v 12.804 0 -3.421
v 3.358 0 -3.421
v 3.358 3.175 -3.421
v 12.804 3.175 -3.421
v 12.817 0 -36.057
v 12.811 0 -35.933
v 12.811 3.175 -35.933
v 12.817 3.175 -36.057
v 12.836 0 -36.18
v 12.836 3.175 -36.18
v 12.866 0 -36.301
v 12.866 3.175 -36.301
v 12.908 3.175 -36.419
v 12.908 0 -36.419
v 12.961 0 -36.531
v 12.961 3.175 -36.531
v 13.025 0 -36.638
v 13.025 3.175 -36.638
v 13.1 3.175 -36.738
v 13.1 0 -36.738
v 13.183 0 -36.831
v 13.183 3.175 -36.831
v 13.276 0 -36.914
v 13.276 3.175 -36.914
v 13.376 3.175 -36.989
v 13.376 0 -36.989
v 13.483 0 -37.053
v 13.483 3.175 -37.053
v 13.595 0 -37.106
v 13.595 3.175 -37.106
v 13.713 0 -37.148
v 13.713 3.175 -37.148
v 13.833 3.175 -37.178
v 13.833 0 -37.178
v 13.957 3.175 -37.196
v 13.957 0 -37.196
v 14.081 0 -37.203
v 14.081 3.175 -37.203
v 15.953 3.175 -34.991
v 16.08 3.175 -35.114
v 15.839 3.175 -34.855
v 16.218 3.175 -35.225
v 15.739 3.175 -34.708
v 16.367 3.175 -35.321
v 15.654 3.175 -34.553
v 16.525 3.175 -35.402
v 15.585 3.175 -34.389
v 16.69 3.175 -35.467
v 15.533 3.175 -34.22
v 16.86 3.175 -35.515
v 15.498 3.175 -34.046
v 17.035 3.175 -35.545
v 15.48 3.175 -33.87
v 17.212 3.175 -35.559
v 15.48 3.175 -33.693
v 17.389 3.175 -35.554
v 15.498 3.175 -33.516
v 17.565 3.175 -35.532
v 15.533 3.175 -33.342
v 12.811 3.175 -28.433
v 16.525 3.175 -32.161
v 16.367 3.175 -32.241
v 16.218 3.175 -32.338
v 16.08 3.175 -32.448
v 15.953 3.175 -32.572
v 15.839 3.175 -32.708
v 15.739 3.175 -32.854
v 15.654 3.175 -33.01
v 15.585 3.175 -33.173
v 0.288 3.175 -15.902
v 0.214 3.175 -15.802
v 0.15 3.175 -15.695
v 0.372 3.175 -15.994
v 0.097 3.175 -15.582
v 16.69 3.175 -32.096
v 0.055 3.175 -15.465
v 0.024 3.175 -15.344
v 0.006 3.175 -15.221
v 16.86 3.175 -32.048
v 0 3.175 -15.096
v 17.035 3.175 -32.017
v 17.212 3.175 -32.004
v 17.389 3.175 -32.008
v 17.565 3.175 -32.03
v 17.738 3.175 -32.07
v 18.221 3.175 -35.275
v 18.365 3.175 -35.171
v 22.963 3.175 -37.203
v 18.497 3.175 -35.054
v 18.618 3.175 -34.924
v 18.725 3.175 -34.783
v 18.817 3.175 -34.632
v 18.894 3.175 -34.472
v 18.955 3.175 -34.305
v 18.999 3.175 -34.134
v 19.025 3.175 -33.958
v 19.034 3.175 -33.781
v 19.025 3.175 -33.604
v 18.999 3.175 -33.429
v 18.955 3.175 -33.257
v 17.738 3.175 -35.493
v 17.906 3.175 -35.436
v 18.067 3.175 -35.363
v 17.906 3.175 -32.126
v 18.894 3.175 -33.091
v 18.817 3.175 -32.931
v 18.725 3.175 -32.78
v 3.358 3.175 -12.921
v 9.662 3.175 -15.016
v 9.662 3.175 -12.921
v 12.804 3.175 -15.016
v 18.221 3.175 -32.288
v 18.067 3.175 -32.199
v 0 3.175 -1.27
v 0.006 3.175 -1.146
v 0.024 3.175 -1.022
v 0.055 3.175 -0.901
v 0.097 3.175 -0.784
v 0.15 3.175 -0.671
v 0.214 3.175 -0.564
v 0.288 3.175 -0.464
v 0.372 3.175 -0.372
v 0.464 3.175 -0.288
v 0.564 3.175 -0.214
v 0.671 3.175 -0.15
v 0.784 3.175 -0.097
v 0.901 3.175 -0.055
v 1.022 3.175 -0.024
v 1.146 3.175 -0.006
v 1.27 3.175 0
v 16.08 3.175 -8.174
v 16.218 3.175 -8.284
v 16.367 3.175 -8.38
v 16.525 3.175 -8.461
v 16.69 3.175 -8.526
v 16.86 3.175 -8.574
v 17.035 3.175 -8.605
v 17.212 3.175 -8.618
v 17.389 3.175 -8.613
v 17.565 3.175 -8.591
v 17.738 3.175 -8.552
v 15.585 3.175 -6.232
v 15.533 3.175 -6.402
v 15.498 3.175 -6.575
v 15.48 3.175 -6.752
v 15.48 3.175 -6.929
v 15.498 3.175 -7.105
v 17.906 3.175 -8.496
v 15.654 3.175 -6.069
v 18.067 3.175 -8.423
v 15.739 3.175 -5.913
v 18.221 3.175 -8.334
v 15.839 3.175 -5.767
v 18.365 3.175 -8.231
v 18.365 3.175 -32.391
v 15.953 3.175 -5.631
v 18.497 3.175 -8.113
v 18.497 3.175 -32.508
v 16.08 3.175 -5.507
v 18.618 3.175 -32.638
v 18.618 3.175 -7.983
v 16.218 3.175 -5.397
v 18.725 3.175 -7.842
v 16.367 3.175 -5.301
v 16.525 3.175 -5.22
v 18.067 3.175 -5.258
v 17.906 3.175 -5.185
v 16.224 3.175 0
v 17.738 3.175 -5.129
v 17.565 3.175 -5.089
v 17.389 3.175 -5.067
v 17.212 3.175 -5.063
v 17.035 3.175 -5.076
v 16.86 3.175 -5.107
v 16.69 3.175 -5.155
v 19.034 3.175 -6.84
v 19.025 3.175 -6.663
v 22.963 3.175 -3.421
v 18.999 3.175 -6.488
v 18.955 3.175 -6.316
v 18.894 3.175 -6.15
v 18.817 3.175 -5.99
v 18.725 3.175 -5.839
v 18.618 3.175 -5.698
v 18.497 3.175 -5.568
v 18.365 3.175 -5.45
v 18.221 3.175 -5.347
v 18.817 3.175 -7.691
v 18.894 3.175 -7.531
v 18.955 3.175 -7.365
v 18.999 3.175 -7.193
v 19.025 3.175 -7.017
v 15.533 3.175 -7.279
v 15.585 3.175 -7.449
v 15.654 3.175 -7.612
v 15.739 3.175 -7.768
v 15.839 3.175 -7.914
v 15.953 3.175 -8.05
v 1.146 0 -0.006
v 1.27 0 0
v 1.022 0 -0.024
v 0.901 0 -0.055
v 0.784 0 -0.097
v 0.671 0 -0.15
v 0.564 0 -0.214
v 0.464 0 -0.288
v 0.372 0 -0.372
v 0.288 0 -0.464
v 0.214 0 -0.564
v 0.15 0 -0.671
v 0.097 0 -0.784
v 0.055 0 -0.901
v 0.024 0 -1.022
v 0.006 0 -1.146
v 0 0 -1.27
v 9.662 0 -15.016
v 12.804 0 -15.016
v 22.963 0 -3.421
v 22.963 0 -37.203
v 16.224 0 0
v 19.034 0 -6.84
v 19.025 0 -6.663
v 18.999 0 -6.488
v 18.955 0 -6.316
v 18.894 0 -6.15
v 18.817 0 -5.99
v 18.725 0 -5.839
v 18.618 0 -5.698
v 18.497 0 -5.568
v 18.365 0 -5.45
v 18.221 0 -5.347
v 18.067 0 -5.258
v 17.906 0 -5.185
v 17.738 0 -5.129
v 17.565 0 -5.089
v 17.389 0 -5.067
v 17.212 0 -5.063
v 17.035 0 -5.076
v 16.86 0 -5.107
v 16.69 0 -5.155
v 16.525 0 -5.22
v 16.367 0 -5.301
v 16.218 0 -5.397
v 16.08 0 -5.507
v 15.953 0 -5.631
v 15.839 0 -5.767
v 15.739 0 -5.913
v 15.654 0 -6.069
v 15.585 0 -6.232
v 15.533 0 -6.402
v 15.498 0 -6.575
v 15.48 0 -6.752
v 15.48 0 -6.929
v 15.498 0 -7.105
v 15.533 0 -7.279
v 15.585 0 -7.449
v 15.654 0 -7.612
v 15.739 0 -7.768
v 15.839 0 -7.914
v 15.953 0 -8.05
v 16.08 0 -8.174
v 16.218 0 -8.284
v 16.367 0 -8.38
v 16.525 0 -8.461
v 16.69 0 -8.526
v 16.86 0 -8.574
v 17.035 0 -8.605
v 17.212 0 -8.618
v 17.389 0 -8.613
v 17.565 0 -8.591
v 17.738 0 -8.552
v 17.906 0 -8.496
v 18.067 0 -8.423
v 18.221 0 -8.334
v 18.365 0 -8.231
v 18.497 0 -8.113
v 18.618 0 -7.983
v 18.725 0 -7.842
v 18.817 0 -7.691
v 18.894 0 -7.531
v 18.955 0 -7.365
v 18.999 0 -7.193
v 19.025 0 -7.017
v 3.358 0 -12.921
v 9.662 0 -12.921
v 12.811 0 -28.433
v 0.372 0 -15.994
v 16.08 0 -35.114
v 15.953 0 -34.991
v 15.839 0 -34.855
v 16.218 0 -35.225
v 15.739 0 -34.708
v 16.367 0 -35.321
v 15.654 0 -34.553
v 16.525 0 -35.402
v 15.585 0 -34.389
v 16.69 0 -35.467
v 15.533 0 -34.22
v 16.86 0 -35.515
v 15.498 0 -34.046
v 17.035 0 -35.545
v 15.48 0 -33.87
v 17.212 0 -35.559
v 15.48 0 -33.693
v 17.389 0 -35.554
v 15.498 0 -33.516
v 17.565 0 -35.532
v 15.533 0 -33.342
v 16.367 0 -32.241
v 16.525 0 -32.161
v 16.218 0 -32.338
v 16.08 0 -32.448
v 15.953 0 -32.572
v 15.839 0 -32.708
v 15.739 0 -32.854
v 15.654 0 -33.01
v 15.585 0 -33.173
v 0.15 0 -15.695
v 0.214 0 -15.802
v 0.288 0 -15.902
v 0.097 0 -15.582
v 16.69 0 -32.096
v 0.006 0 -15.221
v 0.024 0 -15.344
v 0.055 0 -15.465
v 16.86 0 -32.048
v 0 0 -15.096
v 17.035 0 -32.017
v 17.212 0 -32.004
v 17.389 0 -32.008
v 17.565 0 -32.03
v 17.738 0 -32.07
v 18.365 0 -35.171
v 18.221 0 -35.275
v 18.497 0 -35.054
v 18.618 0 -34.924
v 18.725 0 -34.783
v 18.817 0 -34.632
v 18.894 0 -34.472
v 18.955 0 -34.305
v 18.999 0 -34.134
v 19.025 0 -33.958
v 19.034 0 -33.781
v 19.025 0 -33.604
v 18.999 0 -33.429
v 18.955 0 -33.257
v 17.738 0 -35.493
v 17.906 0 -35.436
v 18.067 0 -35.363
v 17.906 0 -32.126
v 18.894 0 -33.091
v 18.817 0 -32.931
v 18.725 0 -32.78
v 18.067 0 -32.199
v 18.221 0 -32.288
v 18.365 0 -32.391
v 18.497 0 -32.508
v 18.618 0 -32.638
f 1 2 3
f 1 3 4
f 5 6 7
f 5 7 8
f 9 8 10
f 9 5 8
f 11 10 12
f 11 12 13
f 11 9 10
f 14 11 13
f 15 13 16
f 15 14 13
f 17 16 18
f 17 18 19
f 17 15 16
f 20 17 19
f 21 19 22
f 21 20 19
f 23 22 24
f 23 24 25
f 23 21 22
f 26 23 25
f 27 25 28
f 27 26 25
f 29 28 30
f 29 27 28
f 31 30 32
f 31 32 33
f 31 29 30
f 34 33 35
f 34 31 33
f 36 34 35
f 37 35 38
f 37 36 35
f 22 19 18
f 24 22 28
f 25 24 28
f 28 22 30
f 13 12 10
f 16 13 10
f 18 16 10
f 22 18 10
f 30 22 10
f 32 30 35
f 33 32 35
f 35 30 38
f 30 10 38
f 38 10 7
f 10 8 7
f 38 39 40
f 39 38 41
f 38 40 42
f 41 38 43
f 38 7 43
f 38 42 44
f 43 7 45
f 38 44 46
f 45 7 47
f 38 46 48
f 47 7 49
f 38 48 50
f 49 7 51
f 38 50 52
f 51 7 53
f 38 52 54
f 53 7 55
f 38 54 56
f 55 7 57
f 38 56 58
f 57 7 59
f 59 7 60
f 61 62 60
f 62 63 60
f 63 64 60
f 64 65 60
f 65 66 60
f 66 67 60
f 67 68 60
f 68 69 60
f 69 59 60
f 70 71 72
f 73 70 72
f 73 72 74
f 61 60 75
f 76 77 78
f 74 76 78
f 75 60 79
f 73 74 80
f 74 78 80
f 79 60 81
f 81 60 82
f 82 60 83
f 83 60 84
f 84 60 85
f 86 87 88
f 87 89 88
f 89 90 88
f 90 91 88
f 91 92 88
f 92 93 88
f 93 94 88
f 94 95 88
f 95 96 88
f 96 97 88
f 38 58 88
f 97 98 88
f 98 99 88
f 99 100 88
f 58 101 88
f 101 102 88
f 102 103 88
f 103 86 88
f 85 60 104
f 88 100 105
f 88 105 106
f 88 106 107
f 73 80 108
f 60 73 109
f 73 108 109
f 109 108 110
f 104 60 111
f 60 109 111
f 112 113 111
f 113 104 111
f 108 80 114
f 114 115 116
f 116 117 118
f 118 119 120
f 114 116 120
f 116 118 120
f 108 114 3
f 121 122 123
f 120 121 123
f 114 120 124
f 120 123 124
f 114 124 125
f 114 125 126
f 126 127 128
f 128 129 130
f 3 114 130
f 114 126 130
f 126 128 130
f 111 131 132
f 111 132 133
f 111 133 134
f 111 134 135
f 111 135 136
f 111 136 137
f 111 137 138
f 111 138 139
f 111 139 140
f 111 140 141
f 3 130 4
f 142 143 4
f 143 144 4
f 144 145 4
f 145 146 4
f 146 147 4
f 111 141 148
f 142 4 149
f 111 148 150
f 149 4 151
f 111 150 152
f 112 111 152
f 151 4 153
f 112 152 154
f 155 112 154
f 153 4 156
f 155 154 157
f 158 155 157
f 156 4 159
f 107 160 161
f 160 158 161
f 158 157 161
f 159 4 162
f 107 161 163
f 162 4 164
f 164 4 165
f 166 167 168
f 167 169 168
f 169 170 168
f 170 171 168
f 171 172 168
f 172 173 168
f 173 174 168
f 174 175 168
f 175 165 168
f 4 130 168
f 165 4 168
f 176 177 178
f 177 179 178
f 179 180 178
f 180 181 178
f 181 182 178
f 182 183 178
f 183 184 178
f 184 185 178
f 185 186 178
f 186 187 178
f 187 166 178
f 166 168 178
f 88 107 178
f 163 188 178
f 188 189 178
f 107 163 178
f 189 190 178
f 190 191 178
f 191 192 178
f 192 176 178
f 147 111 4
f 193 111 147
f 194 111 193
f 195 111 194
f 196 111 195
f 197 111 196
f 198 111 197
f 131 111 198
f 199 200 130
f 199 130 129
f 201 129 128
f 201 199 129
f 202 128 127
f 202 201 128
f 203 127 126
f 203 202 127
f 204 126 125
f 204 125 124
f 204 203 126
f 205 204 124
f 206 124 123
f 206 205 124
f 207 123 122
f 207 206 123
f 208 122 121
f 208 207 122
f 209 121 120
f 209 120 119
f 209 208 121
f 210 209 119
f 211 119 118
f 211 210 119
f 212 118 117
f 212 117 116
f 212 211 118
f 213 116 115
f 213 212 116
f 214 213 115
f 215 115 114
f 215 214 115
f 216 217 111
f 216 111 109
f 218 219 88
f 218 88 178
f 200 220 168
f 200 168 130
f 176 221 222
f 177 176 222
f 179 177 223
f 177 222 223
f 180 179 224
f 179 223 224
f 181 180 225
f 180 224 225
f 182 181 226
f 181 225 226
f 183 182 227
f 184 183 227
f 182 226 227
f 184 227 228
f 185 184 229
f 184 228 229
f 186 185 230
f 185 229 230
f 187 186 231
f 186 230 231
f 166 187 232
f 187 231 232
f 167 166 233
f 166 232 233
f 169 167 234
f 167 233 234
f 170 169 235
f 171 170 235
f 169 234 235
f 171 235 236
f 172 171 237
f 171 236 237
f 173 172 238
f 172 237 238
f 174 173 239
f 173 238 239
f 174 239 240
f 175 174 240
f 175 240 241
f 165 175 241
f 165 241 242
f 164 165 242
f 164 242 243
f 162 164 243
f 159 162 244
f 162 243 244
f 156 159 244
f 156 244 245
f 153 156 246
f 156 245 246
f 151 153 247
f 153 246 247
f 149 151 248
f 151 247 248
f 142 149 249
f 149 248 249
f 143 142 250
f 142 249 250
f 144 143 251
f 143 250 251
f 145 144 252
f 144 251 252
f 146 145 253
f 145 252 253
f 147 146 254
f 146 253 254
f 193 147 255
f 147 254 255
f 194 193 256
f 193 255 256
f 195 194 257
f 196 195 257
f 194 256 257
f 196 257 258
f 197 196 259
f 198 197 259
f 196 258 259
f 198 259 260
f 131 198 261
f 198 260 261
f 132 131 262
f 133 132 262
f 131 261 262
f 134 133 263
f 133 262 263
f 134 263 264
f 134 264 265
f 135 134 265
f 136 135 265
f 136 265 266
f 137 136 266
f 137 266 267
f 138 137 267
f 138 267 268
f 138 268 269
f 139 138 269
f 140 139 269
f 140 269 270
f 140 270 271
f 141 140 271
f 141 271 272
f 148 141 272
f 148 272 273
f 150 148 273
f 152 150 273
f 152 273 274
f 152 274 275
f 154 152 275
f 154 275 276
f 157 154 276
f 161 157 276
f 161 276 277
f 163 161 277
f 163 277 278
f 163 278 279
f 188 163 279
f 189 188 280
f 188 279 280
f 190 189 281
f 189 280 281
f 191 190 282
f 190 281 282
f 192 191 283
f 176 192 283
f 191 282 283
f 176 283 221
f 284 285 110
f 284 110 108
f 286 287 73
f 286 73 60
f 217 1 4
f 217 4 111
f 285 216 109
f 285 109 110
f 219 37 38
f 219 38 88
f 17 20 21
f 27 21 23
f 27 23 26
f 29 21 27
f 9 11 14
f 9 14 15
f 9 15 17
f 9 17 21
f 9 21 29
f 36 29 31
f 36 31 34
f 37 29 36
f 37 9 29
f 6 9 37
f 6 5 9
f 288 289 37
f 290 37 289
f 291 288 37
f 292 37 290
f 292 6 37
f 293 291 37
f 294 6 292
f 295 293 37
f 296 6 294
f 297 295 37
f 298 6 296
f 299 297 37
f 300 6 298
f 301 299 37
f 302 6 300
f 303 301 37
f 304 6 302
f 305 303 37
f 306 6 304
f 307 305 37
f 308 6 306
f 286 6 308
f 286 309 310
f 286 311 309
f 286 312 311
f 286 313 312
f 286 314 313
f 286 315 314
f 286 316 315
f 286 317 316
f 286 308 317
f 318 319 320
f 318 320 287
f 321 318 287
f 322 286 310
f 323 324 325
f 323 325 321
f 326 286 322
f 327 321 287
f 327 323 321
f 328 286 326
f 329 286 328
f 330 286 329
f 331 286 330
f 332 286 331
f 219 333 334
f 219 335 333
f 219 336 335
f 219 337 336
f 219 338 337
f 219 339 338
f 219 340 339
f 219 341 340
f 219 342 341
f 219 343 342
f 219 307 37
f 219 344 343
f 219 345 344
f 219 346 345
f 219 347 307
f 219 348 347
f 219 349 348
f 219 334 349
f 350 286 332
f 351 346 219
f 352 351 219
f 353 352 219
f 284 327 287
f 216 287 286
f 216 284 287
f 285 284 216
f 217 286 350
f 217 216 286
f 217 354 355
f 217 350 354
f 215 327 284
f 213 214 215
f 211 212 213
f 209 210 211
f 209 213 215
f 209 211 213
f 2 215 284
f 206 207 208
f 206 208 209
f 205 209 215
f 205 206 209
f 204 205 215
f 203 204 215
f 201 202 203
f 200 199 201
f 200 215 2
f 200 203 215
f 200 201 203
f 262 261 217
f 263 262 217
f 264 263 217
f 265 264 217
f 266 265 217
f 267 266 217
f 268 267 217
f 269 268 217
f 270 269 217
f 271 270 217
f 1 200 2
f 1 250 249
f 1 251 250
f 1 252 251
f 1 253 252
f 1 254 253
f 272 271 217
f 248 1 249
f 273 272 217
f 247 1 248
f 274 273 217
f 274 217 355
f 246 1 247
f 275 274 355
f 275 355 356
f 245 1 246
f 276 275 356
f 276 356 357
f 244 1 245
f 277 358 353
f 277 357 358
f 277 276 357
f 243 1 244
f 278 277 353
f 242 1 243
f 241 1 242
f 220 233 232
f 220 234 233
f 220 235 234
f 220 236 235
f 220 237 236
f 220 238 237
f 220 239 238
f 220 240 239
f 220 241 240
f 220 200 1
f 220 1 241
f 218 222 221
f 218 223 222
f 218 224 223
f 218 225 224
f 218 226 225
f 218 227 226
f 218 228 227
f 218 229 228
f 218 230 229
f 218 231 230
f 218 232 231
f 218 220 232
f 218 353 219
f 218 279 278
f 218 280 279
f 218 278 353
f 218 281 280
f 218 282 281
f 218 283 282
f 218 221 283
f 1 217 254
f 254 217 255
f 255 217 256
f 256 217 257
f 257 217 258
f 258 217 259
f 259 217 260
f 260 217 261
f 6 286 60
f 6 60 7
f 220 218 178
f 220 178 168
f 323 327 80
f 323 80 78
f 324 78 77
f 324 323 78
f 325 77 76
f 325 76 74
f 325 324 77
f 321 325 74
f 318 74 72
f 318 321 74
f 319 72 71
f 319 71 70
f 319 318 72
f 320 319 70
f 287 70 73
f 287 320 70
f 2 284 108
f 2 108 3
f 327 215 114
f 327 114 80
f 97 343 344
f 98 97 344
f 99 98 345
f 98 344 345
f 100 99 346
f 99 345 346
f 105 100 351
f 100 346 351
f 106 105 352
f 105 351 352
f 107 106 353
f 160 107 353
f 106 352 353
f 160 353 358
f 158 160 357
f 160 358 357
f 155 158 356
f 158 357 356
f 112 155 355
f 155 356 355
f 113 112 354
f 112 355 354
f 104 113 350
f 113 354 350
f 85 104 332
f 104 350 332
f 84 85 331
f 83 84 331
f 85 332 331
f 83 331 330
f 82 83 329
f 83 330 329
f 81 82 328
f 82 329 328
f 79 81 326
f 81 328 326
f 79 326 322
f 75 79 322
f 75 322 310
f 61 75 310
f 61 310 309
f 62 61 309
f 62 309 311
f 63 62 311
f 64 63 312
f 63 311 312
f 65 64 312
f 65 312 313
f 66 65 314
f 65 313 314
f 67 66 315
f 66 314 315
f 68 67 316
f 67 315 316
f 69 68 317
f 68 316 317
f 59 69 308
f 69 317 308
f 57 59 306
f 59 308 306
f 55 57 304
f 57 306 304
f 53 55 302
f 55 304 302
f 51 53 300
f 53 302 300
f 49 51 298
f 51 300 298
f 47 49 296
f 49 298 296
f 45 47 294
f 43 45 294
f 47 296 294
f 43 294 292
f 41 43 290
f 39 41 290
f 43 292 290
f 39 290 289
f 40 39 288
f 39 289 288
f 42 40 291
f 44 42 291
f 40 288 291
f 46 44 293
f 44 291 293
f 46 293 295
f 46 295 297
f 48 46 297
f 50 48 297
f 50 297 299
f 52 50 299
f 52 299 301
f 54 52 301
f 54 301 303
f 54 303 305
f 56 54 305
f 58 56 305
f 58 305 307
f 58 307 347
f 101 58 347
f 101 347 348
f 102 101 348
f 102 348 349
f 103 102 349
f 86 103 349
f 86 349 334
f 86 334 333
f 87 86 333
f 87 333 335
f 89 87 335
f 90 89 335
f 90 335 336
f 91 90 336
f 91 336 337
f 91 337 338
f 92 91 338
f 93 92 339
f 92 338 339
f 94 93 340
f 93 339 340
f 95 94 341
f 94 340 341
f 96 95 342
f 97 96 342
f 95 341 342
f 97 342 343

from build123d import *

# Parameters (mm, degrees)
SKETCH1_R           = 1.778
BOSS_EXTRUDE1_DEPTH = 3.175


with BuildPart() as part:
    # Sketch1 → Boss-Extrude1 (new body)
    with BuildSketch(Plane.XZ):
        with BuildLine():
            Line((0, -1.27), (0, -15.096211993))
            ThreePointArc((0, -15.096211993), (0.096672994, -15.582219953), (0.371974388, -15.994237606))
            Line((0.371974388, -15.994237606), (12.811233382, -28.4334966))
            Line((12.811233382, -28.4334966), (12.811233382, -35.9325926))
            ThreePointArc((12.811233382, -35.9325926), (13.18320777, -36.830618212), (14.081233382, -37.2025926))
            Line((14.081233382, -37.2025926), (22.963359382, -37.2025926))
            Line((22.963359382, -37.2025926), (22.963359382, -3.420573773))
            Line((22.963359382, -3.420573773), (16.223955667, 0))
            Line((16.223955667, 0), (1.27, 0))
            ThreePointArc((1.27, 0), (0.371974388, -0.371974388), (0, -1.27))
        make_face()
        with Locations((17.255979382, -33.7812126)):
            Circle(SKETCH1_R, mode=Mode.SUBTRACT)
        with Locations((17.255979382, -6.840444237)):
            Circle(SKETCH1_R, mode=Mode.SUBTRACT)
        Polygon((9.66216, -12.92098), (3.35788, -12.92098), (3.35788, -3.42138), (12.80414, -3.42138), (12.80414, -15.01648), (9.66216, -15.01648), align=None, mode=Mode.SUBTRACT)
    extrude(amount=-BOSS_EXTRUDE1_DEPTH)


solid = part.part
